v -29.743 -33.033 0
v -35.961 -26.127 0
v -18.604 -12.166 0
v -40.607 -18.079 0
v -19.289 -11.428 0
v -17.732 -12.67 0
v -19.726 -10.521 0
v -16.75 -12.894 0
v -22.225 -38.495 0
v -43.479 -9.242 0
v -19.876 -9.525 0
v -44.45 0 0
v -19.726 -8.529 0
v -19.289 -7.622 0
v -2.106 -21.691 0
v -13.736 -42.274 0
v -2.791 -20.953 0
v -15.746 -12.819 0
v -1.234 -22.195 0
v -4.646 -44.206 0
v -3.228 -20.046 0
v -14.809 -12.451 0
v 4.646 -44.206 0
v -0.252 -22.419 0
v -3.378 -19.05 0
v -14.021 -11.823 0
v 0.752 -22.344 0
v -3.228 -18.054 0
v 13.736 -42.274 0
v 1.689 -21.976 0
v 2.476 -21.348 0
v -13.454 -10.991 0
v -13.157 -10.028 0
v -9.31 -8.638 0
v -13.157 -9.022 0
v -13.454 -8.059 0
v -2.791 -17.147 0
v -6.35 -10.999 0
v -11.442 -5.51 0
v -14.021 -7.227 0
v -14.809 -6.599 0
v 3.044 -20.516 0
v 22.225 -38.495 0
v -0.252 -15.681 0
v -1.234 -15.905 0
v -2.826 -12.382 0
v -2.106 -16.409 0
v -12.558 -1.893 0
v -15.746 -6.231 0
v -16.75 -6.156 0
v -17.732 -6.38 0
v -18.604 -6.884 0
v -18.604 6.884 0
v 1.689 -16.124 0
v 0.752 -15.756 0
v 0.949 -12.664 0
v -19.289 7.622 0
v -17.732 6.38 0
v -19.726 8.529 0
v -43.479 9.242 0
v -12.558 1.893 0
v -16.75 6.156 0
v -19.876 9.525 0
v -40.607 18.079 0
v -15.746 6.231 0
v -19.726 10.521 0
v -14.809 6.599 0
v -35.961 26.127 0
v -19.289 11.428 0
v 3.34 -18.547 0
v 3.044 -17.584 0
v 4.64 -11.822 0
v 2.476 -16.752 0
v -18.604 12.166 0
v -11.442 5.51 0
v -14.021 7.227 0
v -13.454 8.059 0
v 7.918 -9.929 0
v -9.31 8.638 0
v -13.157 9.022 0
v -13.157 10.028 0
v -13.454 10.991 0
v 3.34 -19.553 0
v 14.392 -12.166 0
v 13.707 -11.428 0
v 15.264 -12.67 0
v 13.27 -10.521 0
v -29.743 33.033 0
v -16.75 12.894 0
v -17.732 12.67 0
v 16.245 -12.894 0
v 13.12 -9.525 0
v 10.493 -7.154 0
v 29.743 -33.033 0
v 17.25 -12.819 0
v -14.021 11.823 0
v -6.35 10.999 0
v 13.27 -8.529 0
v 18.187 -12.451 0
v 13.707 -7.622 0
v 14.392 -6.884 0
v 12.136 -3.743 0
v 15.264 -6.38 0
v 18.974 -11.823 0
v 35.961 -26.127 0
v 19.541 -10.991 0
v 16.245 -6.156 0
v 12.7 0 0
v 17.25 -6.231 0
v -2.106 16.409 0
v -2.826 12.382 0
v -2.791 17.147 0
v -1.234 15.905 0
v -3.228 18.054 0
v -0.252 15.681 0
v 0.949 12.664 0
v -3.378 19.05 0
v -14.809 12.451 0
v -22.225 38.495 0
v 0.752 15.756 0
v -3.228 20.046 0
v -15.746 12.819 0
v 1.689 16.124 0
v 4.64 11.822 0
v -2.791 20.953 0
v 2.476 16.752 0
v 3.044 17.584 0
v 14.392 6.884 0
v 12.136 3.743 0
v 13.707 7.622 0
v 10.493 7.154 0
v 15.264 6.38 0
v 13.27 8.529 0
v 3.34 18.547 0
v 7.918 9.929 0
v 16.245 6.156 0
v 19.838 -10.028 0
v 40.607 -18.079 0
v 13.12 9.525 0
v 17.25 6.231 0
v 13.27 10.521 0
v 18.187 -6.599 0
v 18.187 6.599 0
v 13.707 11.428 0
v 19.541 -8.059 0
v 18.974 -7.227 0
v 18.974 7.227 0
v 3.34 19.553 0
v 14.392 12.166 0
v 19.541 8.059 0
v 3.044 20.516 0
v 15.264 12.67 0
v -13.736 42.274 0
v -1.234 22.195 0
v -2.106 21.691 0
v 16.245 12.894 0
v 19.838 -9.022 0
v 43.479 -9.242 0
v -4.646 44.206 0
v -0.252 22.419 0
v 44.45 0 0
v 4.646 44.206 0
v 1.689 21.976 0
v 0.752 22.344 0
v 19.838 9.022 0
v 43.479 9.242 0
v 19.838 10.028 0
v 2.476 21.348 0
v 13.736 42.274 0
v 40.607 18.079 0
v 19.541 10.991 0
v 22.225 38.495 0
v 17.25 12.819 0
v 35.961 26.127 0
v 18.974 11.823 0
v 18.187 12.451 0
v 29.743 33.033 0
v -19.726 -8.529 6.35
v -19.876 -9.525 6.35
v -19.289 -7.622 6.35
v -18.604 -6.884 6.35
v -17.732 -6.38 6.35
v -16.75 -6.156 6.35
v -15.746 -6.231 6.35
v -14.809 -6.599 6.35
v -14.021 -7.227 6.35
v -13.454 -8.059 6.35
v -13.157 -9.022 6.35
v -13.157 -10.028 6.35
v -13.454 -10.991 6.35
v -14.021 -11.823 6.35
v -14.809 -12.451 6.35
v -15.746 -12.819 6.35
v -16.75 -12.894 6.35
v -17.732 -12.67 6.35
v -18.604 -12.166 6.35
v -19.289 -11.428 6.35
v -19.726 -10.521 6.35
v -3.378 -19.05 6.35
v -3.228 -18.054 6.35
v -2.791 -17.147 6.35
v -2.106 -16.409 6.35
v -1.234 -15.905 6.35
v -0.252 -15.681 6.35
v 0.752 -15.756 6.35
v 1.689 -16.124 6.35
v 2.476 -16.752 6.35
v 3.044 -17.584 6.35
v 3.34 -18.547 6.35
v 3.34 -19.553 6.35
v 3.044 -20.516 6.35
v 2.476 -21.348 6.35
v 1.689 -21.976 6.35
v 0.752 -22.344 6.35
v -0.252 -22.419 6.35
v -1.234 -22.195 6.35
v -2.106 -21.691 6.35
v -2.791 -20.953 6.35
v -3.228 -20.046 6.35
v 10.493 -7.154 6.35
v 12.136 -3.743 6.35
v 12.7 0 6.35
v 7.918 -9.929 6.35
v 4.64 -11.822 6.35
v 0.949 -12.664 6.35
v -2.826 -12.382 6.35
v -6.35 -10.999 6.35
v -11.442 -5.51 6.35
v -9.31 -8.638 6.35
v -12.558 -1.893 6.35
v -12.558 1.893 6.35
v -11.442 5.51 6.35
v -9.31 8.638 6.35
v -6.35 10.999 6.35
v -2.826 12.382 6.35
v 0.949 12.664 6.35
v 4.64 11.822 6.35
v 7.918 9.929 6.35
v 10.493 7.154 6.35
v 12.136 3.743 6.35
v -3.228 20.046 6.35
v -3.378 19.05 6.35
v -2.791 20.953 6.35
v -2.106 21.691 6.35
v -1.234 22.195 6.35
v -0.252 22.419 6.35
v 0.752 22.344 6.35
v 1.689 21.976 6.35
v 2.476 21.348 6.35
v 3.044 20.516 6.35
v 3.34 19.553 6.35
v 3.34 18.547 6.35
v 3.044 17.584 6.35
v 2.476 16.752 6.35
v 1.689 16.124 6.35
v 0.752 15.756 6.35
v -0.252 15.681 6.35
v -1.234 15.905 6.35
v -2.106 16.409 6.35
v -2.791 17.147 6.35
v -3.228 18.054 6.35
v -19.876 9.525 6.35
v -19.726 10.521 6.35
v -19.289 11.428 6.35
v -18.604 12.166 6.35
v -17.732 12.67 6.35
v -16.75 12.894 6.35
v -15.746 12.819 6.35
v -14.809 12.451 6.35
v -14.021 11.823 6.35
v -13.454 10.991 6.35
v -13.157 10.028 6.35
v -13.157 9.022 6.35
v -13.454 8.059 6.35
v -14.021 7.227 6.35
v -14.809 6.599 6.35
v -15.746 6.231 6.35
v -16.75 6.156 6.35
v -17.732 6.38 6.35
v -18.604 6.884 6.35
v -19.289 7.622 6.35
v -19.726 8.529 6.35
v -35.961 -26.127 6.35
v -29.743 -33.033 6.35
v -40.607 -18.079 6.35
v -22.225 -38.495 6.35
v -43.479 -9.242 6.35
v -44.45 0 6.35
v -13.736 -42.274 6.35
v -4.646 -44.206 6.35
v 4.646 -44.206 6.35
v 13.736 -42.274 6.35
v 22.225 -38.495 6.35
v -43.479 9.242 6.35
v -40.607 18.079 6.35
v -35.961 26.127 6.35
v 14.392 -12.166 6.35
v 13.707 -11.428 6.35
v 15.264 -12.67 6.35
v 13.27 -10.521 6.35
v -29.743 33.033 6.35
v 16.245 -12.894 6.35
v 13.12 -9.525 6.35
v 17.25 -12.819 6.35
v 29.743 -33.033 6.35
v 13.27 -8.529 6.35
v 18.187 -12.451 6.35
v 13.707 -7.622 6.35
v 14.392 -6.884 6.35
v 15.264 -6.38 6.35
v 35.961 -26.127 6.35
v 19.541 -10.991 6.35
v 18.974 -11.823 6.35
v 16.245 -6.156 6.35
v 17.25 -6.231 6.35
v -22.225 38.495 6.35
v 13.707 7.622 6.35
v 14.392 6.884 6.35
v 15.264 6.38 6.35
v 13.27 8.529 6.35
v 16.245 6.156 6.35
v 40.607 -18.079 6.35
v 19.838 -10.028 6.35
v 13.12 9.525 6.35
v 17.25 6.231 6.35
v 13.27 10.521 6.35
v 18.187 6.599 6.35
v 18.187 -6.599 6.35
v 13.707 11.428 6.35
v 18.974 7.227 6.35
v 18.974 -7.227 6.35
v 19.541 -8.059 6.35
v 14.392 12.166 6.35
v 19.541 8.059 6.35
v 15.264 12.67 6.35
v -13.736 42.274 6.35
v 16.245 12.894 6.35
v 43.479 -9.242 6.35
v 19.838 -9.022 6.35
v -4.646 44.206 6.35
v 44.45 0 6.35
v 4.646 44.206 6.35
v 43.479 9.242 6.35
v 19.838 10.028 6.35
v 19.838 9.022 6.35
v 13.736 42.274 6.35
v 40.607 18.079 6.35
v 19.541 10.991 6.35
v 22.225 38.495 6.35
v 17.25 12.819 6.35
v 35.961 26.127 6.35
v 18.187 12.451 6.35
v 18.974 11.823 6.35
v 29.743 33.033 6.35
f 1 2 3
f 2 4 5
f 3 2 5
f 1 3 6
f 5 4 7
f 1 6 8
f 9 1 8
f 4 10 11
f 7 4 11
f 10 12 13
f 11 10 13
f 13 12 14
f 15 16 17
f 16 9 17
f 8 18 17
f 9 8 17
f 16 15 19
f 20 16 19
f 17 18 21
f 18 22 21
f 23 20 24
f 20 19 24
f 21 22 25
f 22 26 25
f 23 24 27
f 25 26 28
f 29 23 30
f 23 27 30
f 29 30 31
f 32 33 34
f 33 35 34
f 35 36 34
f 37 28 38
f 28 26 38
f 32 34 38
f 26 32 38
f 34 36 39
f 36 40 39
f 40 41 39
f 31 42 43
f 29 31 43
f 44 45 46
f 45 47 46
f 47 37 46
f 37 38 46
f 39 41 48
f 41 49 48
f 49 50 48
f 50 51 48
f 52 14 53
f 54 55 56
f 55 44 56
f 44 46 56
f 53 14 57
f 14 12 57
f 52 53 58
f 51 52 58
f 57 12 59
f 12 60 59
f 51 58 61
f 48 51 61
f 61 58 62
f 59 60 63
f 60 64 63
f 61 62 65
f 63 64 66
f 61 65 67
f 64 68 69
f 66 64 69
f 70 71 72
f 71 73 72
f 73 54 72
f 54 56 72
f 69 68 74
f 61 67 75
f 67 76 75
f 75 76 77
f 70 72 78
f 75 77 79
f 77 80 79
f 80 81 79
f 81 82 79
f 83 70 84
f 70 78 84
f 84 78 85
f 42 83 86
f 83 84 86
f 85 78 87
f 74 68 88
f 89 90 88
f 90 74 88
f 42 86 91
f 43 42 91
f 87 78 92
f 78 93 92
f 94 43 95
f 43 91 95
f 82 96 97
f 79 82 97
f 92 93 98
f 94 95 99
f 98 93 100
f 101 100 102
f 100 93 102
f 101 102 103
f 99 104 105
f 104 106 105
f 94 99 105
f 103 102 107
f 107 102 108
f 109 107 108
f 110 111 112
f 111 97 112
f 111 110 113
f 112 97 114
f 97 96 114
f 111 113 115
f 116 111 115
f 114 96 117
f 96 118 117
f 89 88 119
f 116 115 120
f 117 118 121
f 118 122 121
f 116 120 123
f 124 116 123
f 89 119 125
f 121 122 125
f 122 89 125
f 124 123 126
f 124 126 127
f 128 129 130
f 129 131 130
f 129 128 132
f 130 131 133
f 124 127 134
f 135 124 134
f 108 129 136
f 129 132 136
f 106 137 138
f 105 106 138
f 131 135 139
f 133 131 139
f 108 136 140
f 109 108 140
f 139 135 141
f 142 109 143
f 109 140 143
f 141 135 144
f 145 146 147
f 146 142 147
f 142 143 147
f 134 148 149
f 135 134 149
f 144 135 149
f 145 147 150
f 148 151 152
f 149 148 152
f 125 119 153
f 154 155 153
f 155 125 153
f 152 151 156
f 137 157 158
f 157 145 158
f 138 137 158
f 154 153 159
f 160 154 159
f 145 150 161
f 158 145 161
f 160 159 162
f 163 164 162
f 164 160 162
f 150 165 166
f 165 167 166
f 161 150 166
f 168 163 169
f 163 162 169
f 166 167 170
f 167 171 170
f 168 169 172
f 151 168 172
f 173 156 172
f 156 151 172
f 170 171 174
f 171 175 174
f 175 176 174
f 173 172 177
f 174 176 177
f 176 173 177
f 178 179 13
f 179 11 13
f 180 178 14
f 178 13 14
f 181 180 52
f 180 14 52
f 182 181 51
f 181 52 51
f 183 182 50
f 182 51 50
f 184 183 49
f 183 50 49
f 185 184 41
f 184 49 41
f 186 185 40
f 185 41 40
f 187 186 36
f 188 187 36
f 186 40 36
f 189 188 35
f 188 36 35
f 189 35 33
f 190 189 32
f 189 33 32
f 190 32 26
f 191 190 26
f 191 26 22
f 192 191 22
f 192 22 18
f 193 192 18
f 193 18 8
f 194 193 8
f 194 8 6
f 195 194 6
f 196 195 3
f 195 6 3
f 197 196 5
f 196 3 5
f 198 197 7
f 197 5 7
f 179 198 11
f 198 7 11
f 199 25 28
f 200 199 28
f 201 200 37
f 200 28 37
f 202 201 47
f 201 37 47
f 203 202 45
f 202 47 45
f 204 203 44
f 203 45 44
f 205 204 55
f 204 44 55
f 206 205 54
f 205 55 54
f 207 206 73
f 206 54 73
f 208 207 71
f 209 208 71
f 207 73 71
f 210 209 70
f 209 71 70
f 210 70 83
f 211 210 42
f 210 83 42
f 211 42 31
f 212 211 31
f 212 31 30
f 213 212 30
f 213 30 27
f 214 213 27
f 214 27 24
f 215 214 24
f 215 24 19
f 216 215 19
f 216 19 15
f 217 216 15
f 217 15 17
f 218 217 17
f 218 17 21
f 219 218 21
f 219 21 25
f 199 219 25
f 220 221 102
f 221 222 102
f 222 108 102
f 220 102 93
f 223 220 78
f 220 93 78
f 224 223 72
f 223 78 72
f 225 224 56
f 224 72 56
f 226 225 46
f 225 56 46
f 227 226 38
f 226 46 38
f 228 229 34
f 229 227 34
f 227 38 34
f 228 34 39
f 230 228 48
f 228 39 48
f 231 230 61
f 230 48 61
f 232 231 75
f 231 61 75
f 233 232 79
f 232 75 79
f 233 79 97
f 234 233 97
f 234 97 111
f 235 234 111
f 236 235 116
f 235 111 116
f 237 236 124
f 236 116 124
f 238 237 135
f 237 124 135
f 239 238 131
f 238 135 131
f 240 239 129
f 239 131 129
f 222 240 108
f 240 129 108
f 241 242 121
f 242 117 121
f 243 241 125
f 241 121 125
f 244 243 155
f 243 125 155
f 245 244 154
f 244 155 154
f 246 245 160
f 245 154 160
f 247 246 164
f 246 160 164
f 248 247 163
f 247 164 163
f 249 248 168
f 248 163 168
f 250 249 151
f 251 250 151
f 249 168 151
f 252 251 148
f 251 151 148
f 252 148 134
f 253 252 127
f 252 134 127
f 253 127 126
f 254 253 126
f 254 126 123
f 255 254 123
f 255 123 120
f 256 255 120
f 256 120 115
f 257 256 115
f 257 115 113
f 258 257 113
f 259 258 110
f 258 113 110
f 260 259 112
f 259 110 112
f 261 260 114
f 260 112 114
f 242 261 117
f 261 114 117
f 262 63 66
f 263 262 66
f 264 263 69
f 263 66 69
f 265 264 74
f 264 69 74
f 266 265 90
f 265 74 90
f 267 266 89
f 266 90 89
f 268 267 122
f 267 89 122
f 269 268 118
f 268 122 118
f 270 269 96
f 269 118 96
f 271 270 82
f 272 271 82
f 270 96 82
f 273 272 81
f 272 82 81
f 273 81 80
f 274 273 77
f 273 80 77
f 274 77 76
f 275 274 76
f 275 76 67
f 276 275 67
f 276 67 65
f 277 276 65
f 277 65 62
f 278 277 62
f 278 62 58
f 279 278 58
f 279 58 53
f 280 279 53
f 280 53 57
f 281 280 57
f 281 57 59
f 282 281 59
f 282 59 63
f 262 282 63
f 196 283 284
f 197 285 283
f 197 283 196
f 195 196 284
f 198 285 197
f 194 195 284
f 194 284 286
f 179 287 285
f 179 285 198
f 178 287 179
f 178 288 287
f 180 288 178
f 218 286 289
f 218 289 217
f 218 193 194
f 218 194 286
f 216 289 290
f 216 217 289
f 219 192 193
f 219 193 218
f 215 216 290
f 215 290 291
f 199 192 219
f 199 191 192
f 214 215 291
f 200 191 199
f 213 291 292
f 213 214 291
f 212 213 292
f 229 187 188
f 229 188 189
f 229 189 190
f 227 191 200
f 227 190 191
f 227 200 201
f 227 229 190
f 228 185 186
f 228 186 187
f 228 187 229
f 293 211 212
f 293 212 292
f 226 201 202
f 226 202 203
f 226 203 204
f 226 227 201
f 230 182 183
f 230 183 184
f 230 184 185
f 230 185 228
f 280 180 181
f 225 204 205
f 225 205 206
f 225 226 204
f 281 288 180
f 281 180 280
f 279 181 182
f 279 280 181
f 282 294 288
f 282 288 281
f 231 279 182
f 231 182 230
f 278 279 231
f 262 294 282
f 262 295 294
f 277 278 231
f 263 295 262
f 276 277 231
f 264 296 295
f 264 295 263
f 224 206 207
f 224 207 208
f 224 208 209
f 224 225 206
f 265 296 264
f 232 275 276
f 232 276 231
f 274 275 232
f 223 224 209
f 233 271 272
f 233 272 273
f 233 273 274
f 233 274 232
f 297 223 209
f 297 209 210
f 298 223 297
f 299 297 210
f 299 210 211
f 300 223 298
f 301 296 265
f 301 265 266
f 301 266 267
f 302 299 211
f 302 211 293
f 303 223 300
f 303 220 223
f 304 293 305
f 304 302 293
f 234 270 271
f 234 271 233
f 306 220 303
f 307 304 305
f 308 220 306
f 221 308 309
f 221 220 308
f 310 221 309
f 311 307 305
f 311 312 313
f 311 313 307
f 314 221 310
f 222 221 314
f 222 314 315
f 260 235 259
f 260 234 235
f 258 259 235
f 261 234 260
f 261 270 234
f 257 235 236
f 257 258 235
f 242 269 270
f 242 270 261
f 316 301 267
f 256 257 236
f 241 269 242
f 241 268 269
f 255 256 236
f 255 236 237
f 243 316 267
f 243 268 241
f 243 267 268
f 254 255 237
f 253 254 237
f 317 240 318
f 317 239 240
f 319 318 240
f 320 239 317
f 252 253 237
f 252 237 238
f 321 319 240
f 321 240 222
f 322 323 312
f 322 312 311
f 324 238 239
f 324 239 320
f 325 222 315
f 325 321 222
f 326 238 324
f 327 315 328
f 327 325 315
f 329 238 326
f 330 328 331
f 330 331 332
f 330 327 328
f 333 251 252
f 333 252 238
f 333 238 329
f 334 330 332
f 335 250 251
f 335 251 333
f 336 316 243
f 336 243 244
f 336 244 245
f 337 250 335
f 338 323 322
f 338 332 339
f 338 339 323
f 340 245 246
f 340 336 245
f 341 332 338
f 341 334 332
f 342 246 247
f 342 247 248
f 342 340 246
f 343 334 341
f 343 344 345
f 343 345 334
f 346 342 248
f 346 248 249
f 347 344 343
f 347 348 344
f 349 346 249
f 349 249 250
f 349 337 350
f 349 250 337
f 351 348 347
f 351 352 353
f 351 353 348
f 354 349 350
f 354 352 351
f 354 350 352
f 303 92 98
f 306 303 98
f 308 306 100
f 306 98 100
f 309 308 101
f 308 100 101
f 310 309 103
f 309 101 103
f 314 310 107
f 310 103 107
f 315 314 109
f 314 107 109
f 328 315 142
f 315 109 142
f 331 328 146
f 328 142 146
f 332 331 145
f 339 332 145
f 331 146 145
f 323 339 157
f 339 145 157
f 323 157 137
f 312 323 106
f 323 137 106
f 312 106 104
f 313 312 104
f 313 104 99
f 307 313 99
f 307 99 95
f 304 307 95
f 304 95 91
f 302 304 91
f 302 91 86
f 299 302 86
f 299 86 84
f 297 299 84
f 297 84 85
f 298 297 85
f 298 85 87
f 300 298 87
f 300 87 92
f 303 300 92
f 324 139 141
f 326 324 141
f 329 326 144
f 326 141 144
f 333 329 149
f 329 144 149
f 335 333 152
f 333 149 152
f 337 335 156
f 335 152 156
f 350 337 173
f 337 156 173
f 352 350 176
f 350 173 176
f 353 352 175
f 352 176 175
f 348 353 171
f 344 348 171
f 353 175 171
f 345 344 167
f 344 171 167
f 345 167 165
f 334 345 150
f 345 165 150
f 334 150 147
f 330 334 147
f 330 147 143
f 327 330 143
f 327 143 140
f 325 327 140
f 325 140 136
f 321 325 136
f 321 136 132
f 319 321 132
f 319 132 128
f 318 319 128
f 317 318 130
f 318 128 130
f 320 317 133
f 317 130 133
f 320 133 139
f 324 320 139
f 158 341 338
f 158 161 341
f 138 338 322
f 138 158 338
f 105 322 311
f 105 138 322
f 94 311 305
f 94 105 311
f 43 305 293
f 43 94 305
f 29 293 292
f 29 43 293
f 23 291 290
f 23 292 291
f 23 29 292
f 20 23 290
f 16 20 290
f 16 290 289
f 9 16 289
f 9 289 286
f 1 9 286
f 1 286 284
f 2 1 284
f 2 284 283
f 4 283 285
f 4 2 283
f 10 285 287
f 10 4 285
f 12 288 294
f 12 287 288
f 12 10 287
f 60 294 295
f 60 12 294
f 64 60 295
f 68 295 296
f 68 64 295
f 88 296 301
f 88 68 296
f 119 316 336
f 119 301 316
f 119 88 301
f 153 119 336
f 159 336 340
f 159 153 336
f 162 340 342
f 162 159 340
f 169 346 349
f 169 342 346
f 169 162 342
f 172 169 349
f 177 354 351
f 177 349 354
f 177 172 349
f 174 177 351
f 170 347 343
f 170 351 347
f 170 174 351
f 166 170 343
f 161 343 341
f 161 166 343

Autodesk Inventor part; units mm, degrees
ref_plane "YZ Plane" through (0, 0, 0) normal (1, 0, 0) x (0, 1, 0)
ref_plane "XZ Plane" through (0, 0, 0) normal (0, 1, 0) x (-1, 0, 0)
ref_plane "XY Plane" through (0, 0, 0) normal (0, 0, 1) x (1, 0, 0)
sketch "Sketch1" plane through (0, 0, 0) normal (0, 0, 1) x (1, 0, 0)
  circle A0 centre (0, 0) radius 12.7
  circle A1 centre (0, 0) radius 44.45
  dimension "d0" = 25.4
  dimension "d1" = 88.9
extrude "Extrusion1" add sketch "Sketch1" along normal blind 6.35
sketch "Sketch2" plane through (0, 0, 0) normal (0, 0, -1) x (-1, 0, 0)
  circle A0 centre (0, 0) radius 19.05
  circle A1 centre (0, -19.05) radius 3.3782
  circle A2 centre (16.4978, -9.525) radius 3.3782
  circle A3 centre (16.4978, 9.525) radius 3.3782
  circle A4 centre (0, 19.05) radius 3.3782
  circle A5 centre (-16.4978, 9.525) radius 3.3782
  circle A6 centre (-16.4978, -9.525) radius 3.3782
  dimension "d4" = 38.1
  dimension "d5" = 6.7564
  dimension "d8" = 360
extrude "Extrusion2" cut sketch "Sketch2" against normal blind 6.35 contours A3 A0 | A0 A3 | A2 A0 | A0 A2 | A4 A0 | A0 A4 | A1 A0 | A0 A1 | A5 A0 | A0 A5 | A6 A0 | A0 A6
properties part number "AZUSASprocketSmall"
